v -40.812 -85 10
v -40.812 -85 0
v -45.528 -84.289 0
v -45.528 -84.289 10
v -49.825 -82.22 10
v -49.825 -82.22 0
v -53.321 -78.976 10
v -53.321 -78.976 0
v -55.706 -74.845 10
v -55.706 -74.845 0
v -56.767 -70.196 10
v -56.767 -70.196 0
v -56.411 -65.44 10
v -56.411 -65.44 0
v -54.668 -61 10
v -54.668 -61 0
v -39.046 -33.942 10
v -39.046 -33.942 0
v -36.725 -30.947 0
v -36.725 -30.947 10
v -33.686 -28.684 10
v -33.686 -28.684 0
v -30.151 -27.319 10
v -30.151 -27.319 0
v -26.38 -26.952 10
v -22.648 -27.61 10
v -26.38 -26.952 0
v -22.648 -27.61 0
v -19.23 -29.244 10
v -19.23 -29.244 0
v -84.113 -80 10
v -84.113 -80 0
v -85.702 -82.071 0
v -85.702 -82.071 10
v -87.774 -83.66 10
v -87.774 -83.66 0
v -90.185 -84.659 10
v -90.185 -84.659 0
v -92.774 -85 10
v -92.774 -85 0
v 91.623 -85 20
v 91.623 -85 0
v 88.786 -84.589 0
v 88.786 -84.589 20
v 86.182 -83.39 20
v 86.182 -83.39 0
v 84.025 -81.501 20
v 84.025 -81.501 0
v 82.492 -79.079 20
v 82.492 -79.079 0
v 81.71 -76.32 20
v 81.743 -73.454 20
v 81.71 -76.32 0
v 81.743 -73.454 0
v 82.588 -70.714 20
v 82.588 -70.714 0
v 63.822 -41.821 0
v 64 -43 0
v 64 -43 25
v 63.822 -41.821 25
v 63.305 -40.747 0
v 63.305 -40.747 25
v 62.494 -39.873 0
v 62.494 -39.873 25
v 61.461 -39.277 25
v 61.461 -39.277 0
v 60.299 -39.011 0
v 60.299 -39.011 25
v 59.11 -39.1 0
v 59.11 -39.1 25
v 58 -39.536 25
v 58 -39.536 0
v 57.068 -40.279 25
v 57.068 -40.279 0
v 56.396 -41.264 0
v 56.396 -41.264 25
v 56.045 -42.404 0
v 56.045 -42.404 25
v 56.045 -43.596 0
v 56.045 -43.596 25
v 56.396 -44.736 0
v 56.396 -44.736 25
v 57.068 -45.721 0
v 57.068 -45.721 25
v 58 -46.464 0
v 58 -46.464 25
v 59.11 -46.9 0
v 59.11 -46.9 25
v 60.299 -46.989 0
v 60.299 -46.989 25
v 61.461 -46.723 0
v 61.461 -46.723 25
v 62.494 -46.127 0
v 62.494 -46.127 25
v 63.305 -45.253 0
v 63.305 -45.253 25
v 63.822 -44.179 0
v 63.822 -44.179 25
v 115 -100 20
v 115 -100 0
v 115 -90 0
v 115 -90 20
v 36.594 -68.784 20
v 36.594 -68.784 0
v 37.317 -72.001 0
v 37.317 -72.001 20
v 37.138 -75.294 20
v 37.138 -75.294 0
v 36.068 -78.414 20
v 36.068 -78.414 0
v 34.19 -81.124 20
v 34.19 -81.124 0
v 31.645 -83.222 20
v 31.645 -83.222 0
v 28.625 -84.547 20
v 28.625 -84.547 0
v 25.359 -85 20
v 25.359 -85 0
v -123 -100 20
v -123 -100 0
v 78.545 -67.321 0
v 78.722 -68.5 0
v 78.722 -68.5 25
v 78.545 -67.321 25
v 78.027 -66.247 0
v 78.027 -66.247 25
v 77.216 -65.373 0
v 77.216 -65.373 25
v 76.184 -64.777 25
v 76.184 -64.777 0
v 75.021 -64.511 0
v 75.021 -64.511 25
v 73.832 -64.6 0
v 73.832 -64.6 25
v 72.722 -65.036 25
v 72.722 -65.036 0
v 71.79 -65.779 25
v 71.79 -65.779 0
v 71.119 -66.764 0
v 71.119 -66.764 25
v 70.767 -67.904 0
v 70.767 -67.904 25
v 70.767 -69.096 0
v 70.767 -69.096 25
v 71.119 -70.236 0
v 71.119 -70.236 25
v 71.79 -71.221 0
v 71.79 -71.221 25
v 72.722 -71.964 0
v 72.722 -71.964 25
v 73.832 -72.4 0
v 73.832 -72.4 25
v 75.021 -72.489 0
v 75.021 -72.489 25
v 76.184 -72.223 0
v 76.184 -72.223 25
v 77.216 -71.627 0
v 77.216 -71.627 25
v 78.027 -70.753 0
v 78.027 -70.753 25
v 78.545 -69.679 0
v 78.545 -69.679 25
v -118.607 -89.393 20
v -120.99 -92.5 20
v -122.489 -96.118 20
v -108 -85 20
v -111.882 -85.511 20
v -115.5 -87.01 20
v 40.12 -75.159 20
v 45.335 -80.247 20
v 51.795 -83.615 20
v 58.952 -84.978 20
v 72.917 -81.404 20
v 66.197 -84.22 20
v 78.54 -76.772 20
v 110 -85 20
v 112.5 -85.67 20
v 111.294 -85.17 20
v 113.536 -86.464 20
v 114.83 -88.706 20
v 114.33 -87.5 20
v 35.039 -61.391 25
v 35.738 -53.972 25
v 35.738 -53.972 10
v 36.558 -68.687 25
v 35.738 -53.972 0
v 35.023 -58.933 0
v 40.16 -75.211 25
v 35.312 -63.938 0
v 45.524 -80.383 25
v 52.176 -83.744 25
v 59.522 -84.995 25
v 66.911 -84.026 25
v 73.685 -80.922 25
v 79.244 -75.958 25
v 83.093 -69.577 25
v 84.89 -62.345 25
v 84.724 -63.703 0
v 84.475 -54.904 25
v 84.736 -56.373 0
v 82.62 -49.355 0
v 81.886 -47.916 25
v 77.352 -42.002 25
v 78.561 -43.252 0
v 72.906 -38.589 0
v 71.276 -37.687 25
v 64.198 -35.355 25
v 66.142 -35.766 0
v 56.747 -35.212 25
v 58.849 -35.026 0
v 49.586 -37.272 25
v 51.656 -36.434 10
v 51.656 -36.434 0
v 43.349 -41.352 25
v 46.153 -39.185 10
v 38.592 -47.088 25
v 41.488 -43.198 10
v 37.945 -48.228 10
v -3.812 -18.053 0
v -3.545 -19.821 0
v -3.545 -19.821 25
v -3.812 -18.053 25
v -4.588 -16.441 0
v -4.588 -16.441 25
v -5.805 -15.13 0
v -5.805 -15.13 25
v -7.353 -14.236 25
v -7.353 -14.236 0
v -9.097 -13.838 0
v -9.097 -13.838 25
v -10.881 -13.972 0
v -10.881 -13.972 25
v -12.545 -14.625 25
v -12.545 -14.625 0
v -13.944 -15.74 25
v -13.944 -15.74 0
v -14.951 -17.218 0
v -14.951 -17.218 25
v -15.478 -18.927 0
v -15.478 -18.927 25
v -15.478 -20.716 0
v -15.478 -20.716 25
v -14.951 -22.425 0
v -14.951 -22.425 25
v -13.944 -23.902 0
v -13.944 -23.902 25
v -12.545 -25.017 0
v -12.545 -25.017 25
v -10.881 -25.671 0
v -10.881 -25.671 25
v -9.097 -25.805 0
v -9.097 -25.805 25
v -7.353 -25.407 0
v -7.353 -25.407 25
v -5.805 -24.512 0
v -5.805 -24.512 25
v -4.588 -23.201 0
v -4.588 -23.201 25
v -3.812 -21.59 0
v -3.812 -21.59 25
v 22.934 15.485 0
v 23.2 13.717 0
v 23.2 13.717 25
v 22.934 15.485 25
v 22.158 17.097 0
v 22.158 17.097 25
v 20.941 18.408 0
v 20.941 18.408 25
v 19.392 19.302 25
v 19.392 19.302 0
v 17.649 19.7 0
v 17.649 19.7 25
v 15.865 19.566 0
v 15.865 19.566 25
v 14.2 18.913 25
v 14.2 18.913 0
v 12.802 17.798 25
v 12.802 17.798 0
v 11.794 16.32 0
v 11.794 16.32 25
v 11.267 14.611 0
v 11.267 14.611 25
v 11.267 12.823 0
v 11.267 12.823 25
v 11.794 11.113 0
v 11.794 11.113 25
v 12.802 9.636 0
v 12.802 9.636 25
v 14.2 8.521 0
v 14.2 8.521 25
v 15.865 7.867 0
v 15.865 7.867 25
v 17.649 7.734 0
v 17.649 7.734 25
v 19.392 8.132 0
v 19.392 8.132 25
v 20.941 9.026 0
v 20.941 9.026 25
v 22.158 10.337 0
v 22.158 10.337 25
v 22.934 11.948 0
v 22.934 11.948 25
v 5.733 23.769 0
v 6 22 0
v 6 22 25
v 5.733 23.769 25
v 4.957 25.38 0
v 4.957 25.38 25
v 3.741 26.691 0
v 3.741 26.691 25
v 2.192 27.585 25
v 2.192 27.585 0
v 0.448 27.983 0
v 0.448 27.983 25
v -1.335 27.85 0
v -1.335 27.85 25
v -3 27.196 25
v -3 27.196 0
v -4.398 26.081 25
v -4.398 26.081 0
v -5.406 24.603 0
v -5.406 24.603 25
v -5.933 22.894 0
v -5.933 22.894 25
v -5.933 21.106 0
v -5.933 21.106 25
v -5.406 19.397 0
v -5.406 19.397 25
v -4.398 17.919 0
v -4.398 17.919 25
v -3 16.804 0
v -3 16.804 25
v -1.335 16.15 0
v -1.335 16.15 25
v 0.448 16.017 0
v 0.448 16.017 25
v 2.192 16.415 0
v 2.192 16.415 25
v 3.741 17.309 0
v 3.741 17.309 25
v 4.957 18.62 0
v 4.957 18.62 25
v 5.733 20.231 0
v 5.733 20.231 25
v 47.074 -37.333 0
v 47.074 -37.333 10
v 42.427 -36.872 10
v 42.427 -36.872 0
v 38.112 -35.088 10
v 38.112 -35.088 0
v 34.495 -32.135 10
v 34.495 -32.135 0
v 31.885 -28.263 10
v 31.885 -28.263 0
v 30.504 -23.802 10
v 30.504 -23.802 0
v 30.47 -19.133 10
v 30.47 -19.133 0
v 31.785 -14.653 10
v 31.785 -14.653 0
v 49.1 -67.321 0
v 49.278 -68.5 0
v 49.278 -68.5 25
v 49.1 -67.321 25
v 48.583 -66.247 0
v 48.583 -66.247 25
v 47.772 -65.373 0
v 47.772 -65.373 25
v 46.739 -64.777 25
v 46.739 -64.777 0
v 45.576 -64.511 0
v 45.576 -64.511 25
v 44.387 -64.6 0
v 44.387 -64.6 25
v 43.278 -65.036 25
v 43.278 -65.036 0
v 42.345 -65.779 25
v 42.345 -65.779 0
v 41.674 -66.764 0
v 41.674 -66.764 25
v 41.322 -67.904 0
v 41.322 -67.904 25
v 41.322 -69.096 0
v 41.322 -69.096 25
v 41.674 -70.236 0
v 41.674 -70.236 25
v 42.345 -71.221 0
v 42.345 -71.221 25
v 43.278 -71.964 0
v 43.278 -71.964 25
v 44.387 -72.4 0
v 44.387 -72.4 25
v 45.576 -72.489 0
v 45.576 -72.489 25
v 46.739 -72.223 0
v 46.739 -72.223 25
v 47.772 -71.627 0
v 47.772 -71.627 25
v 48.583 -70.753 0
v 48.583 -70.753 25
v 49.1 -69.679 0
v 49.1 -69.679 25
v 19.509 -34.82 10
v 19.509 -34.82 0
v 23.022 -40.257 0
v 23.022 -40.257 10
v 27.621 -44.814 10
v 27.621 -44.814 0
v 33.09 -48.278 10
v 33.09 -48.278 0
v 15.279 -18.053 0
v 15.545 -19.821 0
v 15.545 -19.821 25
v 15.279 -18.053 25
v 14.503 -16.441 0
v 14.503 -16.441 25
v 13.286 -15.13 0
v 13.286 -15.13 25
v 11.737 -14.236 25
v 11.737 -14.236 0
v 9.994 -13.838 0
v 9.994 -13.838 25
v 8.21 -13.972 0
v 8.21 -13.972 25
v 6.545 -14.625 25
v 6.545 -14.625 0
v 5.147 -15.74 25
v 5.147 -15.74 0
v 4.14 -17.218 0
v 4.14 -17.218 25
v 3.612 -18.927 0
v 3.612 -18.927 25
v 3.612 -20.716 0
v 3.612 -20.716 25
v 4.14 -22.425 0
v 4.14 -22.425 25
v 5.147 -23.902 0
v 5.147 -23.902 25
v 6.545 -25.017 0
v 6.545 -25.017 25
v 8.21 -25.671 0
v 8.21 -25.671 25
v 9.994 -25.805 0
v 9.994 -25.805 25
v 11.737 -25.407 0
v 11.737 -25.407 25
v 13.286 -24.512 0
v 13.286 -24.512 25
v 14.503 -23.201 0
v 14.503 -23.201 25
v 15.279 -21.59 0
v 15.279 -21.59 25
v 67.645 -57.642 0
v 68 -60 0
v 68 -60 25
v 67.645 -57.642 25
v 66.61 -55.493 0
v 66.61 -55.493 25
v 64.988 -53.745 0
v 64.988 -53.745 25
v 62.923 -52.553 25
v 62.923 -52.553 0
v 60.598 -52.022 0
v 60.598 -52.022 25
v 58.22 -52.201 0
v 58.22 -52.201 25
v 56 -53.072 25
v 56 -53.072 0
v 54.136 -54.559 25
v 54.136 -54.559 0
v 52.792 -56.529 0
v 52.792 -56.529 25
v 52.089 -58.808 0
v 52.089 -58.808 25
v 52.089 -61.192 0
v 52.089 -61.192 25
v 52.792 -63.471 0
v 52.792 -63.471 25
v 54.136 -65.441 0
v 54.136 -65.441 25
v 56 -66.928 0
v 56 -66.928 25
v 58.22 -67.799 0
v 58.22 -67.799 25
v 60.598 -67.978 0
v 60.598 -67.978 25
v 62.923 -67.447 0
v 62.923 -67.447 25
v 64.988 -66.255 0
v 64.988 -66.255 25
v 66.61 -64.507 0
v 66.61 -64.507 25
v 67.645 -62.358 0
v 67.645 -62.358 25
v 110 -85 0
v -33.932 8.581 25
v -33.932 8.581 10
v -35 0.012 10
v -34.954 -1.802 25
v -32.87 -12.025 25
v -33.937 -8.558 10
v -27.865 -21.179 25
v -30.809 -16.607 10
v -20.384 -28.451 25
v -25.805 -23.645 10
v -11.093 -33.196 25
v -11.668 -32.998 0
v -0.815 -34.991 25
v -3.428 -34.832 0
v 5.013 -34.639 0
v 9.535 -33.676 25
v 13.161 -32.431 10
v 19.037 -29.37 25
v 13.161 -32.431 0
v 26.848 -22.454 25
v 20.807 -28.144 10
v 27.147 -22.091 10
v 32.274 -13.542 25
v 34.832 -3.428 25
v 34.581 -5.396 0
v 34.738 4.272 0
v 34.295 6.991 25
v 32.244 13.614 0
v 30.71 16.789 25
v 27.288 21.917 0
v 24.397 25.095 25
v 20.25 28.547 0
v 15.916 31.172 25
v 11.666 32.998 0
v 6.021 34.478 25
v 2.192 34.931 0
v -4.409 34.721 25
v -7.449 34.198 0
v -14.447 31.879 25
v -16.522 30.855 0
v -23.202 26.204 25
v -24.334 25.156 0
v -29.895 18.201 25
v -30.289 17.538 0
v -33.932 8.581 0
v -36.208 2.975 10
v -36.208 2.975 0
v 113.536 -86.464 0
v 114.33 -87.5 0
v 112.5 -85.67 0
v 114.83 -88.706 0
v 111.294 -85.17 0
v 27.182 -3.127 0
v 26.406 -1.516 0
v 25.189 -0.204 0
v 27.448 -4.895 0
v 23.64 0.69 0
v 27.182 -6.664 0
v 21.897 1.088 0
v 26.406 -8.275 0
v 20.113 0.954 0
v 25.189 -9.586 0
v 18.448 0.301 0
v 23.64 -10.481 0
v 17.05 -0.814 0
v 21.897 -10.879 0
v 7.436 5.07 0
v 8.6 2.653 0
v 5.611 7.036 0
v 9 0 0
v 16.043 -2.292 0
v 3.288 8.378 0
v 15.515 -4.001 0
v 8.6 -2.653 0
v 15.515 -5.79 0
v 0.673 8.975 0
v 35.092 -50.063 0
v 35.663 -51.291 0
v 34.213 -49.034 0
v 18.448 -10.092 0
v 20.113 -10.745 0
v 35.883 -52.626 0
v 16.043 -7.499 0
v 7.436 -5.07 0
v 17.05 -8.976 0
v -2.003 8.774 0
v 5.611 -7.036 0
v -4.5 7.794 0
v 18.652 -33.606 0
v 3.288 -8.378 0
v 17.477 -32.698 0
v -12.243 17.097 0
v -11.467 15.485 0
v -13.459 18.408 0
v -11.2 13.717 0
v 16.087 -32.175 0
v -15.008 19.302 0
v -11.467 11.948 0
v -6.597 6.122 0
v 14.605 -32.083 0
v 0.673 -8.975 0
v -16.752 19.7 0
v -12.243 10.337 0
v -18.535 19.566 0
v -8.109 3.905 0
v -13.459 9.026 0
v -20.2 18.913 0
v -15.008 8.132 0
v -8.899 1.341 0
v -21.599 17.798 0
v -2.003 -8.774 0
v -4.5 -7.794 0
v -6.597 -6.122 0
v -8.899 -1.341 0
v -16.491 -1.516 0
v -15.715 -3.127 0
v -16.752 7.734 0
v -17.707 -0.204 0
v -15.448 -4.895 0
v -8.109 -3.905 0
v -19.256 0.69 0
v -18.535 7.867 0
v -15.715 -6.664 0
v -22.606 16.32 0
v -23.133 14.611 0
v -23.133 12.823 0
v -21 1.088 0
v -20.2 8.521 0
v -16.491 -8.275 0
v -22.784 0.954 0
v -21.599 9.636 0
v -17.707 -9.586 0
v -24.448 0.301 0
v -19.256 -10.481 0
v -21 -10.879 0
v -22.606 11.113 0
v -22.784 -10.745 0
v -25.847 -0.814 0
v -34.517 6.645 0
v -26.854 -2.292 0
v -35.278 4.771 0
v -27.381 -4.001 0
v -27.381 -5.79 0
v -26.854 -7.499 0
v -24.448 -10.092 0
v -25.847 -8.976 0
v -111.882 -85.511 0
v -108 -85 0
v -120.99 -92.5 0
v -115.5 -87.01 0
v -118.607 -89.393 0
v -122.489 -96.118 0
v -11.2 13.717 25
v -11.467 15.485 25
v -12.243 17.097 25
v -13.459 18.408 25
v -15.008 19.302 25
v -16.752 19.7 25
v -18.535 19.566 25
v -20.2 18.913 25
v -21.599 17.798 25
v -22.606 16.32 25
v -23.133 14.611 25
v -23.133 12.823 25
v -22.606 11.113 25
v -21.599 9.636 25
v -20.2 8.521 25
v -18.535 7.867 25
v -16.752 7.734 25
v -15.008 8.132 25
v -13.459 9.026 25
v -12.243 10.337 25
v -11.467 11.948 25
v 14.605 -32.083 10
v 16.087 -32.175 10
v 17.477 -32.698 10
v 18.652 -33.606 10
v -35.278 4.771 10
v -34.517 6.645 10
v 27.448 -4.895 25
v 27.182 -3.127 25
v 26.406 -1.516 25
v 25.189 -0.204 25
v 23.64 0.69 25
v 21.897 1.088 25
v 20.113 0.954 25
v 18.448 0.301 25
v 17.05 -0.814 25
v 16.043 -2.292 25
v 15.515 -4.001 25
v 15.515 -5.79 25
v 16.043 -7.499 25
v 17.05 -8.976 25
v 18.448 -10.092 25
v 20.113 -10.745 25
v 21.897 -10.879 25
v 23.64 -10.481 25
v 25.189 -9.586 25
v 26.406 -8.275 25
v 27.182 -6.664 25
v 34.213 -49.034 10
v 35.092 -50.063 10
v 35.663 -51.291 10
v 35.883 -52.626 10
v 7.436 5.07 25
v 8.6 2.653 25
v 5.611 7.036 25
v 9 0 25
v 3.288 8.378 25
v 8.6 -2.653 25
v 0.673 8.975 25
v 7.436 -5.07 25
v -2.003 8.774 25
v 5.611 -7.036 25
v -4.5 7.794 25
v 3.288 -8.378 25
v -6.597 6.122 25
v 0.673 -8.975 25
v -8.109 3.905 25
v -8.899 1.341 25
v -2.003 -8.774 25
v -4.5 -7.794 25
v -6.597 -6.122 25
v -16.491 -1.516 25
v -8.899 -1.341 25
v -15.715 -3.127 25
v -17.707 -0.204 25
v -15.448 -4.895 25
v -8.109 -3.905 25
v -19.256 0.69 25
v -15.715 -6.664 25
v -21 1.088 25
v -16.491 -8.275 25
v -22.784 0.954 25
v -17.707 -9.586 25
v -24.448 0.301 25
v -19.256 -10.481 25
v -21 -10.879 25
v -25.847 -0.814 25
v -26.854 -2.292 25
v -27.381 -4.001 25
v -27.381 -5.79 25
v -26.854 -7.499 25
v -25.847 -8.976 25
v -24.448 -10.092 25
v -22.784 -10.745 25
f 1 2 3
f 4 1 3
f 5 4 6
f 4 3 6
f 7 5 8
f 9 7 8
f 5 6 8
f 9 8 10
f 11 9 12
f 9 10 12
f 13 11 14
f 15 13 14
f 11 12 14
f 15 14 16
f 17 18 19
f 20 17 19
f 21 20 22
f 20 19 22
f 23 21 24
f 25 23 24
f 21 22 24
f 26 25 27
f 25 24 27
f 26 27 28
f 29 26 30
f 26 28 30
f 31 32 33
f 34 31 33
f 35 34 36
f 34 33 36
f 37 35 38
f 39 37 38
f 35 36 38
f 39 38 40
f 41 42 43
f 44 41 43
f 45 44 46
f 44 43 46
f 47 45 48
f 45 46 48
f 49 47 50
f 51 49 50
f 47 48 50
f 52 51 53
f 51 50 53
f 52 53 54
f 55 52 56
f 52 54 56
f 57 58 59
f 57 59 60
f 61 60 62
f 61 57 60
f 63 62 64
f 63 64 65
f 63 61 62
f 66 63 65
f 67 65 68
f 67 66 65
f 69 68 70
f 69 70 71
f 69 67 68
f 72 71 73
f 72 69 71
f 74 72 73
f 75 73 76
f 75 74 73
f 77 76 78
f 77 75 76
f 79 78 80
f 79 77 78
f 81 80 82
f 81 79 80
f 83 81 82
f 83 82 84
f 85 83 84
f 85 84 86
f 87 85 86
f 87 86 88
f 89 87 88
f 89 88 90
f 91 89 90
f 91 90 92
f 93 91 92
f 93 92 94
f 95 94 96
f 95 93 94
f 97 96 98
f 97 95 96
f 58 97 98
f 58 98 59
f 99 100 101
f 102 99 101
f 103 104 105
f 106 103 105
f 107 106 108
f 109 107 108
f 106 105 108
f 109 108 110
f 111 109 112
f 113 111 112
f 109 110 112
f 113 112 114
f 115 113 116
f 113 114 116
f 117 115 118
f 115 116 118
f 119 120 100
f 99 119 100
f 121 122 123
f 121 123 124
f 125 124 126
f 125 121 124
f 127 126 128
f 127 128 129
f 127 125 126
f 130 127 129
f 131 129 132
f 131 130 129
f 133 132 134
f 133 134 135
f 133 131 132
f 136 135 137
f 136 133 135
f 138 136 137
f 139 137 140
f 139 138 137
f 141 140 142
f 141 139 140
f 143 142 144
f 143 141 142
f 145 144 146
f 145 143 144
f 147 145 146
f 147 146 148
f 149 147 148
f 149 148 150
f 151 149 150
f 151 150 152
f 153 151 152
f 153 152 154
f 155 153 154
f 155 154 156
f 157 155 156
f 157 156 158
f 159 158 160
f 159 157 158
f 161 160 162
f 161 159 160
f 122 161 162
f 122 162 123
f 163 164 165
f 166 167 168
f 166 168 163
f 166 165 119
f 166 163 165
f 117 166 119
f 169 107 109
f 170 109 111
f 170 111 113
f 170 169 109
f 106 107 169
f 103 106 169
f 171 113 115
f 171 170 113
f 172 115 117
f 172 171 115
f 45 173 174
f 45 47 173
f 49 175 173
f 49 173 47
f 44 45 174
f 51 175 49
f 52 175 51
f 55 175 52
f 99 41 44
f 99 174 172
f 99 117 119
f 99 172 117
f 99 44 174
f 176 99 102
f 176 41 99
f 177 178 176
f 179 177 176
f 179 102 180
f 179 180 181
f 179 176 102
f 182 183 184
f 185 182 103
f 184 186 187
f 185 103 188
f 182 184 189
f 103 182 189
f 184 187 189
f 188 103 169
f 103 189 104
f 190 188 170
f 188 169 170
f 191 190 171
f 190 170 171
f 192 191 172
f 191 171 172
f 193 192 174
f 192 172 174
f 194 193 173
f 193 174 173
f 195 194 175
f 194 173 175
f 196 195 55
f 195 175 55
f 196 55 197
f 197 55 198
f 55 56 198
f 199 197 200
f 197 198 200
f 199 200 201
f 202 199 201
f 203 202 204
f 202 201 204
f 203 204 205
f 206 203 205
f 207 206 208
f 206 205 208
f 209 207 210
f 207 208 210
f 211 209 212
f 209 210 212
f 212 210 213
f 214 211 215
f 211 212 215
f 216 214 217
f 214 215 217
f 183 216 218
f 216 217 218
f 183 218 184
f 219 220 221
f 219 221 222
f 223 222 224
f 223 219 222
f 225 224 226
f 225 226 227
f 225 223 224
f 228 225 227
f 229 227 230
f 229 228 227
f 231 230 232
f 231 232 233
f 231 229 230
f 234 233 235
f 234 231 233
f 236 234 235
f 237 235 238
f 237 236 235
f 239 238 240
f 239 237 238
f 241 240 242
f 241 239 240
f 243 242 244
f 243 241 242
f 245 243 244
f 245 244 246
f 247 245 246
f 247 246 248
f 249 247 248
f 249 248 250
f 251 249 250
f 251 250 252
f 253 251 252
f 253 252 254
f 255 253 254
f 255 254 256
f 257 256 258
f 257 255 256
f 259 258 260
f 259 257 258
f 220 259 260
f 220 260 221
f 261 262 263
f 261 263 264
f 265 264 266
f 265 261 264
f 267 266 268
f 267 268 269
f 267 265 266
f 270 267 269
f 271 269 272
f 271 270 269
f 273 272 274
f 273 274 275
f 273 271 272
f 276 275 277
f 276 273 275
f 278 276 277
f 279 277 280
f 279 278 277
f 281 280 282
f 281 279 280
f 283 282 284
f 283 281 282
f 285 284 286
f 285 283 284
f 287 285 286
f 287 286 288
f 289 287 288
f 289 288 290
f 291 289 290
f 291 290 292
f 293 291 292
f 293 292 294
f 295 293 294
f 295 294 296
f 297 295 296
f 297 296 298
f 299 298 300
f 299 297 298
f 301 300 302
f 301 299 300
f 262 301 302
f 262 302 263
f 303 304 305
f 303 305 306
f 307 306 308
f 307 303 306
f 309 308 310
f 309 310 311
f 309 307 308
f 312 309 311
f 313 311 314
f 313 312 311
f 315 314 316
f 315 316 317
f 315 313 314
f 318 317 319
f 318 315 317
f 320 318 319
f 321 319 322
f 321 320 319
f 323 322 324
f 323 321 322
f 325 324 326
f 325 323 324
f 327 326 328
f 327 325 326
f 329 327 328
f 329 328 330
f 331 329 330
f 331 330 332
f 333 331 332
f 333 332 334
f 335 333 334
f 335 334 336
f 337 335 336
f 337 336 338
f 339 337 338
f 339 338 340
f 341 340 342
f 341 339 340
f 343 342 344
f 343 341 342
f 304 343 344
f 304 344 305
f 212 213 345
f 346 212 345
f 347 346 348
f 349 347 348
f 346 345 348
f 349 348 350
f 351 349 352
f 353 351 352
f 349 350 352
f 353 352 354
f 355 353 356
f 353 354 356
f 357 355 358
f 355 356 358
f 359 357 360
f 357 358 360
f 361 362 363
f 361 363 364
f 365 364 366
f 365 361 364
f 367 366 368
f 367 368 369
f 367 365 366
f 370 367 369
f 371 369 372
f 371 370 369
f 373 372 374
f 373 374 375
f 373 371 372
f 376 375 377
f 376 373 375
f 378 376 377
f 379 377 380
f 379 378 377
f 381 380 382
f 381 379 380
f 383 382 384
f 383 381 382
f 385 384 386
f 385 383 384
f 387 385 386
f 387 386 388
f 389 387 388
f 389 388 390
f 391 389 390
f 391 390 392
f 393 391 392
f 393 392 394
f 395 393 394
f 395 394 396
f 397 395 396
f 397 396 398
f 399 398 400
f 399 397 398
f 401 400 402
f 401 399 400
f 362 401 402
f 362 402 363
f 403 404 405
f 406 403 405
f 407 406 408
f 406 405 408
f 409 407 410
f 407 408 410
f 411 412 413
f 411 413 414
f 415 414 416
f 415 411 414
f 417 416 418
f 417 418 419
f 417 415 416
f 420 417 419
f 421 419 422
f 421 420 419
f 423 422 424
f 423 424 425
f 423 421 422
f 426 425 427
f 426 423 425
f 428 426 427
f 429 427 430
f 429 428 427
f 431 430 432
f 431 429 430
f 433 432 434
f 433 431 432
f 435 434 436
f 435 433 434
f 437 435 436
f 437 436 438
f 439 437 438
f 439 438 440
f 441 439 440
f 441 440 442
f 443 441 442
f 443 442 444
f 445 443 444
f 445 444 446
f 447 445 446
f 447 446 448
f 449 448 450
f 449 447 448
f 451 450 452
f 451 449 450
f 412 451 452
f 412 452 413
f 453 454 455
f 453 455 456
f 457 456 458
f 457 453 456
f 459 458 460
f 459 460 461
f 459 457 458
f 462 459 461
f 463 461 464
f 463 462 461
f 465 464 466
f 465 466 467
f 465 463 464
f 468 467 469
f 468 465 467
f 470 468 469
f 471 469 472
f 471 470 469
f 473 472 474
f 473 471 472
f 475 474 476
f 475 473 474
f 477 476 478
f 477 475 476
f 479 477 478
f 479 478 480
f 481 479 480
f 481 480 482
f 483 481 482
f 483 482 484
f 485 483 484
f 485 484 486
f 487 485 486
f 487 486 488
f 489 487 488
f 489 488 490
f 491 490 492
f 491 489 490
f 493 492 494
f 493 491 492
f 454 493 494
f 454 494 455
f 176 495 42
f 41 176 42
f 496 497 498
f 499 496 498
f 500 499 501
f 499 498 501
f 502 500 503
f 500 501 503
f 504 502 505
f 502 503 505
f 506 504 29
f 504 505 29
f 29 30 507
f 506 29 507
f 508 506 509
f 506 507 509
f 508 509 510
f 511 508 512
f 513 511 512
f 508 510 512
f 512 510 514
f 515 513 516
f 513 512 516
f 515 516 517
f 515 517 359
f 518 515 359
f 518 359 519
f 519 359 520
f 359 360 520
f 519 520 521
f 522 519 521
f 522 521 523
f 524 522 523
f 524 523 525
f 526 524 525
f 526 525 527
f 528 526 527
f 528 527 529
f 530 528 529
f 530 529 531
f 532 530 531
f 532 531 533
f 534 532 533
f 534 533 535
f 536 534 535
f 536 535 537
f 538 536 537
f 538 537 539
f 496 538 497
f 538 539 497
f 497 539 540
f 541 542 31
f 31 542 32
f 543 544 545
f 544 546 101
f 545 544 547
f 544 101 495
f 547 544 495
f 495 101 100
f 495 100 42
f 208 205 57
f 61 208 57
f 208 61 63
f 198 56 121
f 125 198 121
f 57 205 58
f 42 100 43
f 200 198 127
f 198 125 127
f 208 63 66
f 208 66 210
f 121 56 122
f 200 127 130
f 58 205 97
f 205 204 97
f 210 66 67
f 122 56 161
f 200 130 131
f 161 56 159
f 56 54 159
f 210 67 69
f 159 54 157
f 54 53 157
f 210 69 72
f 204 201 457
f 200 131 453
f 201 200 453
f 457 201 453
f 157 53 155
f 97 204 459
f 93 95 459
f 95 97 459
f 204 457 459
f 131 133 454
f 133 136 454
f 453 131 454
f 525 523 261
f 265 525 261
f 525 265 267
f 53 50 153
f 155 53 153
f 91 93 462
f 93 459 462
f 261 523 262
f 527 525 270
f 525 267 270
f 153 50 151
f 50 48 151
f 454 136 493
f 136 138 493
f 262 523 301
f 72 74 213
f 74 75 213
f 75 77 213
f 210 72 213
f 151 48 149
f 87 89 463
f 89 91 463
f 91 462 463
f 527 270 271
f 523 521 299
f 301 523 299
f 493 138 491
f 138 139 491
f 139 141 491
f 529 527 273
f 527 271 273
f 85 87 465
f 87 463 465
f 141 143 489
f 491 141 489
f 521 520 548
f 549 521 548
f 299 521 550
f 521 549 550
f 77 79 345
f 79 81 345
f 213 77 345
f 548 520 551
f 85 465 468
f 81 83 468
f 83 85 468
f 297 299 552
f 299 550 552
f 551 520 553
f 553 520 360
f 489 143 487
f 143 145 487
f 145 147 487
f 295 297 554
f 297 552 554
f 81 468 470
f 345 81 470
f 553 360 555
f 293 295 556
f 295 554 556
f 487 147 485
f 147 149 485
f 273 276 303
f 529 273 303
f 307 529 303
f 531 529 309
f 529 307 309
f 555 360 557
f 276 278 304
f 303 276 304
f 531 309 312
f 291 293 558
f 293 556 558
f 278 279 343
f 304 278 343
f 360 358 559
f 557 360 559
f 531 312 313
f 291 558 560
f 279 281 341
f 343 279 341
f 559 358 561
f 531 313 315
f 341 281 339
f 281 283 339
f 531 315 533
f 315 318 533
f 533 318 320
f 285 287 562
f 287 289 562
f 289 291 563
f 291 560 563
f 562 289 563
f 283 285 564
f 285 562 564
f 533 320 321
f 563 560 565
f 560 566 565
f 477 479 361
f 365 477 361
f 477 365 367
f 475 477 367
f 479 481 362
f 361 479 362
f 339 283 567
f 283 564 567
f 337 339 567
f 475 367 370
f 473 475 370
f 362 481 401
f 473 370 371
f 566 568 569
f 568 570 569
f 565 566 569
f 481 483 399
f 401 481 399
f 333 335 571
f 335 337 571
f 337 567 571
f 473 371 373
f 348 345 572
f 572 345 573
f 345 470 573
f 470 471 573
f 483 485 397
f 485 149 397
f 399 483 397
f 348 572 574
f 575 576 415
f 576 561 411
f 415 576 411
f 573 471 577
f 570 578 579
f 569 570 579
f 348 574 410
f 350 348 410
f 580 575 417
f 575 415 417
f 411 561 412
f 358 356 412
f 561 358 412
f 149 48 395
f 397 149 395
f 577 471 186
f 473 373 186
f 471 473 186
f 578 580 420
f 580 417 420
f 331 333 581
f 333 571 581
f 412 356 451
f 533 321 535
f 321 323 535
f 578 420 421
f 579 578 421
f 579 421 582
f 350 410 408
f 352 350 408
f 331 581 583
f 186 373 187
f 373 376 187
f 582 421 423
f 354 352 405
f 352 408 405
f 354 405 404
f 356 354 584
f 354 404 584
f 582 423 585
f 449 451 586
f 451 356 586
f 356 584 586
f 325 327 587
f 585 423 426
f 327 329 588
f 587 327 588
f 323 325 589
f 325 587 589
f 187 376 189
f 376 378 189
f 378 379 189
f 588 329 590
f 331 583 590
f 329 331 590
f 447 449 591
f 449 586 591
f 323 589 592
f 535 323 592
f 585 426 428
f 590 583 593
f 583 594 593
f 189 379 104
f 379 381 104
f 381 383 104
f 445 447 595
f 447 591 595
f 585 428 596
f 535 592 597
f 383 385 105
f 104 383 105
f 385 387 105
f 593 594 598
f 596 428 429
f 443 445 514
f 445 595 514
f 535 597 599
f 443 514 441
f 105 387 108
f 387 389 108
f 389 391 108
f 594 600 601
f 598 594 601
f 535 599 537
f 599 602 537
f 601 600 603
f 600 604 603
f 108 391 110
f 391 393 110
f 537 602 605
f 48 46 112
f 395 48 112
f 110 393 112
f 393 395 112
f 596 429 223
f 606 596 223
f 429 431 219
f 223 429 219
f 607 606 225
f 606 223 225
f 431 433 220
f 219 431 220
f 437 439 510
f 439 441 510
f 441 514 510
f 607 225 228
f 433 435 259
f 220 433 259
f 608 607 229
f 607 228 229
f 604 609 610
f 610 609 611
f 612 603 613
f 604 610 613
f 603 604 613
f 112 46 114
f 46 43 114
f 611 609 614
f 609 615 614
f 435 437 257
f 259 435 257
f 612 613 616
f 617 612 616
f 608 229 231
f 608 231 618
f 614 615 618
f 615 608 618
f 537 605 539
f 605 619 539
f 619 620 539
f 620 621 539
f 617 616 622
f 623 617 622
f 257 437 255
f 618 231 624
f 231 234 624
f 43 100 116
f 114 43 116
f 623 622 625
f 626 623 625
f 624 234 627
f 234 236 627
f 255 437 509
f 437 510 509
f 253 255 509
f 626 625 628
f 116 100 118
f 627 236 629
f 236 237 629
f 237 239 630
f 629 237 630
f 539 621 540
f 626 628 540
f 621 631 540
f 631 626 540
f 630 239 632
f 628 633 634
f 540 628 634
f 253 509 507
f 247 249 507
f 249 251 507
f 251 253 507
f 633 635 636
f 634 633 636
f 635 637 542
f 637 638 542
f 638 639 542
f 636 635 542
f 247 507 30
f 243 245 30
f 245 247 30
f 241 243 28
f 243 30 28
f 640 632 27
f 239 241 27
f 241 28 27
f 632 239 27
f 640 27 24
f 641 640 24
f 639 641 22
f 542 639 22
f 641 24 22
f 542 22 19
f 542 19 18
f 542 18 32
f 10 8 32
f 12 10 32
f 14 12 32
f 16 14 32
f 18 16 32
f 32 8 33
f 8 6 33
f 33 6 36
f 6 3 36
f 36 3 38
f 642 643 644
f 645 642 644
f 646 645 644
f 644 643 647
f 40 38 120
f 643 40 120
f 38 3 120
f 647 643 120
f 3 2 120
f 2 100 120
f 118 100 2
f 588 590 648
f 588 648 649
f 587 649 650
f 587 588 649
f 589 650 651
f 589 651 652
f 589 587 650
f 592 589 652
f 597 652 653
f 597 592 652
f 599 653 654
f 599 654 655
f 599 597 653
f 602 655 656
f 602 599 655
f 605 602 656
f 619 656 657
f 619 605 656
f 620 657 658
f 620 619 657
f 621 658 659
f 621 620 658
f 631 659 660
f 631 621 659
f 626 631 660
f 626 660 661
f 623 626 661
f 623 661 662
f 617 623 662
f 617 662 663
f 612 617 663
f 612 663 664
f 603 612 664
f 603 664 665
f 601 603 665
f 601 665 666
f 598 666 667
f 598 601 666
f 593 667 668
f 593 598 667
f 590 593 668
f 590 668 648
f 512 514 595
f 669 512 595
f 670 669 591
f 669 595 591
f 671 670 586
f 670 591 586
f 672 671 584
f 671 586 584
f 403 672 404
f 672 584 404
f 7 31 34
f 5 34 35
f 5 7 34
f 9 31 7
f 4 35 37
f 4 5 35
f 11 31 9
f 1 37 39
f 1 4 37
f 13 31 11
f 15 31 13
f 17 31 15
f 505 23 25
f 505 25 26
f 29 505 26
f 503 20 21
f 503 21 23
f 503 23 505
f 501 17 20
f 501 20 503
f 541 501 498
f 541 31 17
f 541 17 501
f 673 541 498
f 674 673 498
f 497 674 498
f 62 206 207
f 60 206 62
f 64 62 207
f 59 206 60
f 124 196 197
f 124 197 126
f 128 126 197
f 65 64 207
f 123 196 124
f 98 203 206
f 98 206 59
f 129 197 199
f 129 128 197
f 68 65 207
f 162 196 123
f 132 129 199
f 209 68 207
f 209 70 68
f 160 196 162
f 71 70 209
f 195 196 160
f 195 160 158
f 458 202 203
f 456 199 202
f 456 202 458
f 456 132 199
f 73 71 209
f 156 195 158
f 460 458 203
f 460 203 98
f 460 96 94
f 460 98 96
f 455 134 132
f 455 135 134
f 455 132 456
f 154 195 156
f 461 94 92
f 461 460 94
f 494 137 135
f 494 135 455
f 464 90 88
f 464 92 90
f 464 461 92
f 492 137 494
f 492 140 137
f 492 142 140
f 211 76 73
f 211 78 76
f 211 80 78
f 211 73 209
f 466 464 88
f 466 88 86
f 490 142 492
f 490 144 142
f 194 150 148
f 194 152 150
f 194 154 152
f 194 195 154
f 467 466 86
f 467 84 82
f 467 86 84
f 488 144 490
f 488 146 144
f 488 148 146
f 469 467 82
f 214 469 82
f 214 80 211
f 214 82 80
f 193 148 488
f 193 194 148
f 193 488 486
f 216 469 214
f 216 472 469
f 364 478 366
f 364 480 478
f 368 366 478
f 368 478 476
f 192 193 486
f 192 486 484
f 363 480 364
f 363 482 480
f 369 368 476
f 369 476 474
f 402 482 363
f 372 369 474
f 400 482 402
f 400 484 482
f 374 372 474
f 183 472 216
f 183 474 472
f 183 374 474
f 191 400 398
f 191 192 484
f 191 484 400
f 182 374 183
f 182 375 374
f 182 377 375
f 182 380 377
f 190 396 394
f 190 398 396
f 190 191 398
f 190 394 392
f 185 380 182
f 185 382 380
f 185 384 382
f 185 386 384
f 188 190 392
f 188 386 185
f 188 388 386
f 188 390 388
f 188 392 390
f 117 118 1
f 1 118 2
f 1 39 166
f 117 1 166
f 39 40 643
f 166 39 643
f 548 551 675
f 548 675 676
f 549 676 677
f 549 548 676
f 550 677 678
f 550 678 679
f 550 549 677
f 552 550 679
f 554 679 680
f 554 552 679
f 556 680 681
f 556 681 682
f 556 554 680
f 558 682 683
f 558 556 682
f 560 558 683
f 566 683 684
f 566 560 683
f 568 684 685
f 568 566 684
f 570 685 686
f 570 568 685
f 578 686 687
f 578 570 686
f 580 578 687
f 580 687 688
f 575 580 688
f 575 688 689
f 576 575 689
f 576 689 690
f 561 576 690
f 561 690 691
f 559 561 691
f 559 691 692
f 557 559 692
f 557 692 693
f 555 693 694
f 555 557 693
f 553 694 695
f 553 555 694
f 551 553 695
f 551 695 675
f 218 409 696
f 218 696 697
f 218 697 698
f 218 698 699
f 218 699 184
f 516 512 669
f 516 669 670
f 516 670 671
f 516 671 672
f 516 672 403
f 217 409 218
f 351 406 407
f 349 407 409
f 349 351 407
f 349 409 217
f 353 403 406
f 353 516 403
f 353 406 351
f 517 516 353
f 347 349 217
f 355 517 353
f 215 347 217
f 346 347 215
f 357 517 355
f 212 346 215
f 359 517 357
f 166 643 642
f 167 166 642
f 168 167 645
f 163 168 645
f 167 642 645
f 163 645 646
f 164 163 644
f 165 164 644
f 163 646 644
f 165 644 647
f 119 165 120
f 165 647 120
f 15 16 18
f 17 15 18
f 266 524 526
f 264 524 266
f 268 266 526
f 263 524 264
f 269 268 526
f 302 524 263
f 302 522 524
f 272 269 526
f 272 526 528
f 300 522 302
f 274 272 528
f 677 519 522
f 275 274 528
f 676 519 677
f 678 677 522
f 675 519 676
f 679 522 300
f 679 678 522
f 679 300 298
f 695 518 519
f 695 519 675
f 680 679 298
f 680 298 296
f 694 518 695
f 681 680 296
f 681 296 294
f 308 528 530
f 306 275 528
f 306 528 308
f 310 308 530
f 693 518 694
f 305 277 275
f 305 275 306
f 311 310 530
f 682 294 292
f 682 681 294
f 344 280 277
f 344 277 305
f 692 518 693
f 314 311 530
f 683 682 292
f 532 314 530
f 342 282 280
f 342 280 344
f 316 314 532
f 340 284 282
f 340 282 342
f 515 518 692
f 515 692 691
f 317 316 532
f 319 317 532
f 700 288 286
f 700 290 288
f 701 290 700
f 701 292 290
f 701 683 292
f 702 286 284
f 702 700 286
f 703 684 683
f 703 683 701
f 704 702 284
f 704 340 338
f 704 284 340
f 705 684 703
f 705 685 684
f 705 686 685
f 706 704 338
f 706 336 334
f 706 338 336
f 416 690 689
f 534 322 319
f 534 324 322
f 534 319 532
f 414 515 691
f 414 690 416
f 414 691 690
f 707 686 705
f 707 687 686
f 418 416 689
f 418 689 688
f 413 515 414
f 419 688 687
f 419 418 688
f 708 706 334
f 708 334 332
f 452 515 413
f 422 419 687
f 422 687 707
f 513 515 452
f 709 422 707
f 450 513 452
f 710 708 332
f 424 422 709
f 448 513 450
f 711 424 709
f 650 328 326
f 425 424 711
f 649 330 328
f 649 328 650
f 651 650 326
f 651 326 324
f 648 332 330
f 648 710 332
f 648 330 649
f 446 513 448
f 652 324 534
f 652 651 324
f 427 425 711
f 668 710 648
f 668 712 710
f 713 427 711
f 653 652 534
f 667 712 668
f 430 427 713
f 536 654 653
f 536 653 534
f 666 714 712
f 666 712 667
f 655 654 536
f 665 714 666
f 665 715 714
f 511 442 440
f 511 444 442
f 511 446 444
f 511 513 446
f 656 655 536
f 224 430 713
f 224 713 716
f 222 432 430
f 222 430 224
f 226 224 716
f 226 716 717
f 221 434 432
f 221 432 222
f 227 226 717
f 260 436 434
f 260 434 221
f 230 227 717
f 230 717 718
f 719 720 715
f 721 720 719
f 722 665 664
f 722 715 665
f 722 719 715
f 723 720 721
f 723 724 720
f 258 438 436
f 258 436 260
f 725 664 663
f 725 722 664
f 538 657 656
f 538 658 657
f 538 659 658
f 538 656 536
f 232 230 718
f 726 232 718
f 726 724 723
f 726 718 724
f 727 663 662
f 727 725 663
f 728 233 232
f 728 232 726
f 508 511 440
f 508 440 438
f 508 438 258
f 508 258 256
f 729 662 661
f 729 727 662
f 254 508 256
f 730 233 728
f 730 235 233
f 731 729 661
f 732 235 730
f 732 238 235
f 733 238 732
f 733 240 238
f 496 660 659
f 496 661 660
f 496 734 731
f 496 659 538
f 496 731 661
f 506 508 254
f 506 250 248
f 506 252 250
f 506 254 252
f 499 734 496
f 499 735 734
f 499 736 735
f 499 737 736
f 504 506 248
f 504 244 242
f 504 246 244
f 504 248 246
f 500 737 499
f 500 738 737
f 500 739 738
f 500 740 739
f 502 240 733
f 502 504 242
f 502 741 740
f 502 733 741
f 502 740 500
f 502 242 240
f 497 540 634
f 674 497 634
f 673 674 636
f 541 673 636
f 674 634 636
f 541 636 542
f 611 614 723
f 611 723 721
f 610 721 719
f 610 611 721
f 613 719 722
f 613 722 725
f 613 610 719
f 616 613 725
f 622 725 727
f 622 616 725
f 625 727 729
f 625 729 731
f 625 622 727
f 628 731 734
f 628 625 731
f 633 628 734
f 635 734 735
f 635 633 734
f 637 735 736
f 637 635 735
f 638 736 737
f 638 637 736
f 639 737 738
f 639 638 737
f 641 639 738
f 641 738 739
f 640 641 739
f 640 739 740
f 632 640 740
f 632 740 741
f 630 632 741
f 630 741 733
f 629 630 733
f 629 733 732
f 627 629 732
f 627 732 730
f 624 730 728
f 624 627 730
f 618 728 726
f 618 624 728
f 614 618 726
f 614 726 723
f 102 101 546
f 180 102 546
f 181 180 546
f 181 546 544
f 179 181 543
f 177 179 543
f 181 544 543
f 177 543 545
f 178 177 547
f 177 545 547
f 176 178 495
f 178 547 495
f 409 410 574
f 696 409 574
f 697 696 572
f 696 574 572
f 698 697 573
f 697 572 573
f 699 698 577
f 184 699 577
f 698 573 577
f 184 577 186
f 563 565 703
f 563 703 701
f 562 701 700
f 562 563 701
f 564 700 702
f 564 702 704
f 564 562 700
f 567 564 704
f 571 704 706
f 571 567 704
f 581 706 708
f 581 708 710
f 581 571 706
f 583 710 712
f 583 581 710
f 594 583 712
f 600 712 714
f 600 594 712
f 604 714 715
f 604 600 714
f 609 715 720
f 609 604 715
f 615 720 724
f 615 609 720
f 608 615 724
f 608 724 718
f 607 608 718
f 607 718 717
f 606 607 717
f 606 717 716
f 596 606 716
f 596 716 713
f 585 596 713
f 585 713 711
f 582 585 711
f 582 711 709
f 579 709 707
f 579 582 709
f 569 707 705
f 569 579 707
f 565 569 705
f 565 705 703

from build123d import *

# Parameters (mm, degrees)
EXTRUDE_1_DEPTH   = 10
EXTRUDE_1_2_DEPTH = 10
EXTRUDE_2_DEPTH   = 20
SKETCH_1_4_R      = 35
SKETCH_1_4_R_2    = 6
SKETCH_1_4_R_3    = 9
SKETCH_1_4_R_4    = 25
SKETCH_1_4_R_5    = 8
SKETCH_1_4_R_6    = 4
EXTRUDE_3_DEPTH   = 25


# Read off the part's stored shape, not the designer's step: Бобышка-Вытянуть2
with BuildPart() as part:
    # Эскиз1 → Бобышка-Вытянуть1 (new body)
    with BuildSketch(Plane.XY):
        with BuildLine():
            ThreePointArc((-84.113248654, -80), (-87.773502692, -83.660254038), (-92.773502692, -85))
            Line((-92.773502692, -85), (-68.524791386, -85))
            Line((-68.524791386, -85), (-40.811978465, -85))
            ThreePointArc((-40.811978465, -85), (-54.668384925, -77), (-54.668384925, -61))
            Line((-54.668384925, -61), (-39.046205937, -33.941592266))
            ThreePointArc((-39.046205937, -33.941592266), (-30.151152872, -27.319125354), (-19.22989306, -29.243994476))
            ThreePointArc((-19.22989306, -29.243994476), (-32.622426184, -12.679799284), (-33.931812223, 8.580915992))
            ThreePointArc((-33.931812223, 8.580915992), (-34.876159455, 5.699155379), (-36.207821023, 2.974634616))
            Line((-36.207821023, 2.974634616), (-84.113248654, -80))
        make_face()
    extrude(amount=EXTRUDE_1_DEPTH)

    # Бобышка-Вытянуть2 outline → Бобышка-Вытянуть2 (add)
    with BuildSketch(Plane.XY):
        with BuildLine():
            ThreePointArc((91.622776602, -85), (83.171234054, -80.345224838), (82.587697573, -70.714285714))
            ThreePointArc((82.587697573, -70.714285714), (58.951595602, -84.978007291), (36.593908006, -68.783783784))
            ThreePointArc((36.593908006, -68.783783784), (35.222923087, -79.833937569), (25.358983849, -85))
            Line((25.358983849, -85), (-108.0001, -85))
            ThreePointArc((-108.0001, -85), (-118.606631007, -89.393368993), (-123, -99.9999))
            Line((-123, -99.9999), (115, -100))
            Line((115, -100), (115, -90))
            ThreePointArc((115, -90), (113.535533906, -86.464466094), (110, -85))
            Line((110, -85), (91.622776602, -85))
        make_face()
    extrude(amount=EXTRUDE_2_DEPTH)



with BuildPart() as body_2:
    # Эскиз1 → Extrude 1 2 (new body)
    with BuildSketch(Plane.XY):
        with BuildLine():
            ThreePointArc((33.089534913, -48.278298017), (35.418808442, -50.657512303), (35.737666875, -53.971800326))
            ThreePointArc((35.737666875, -53.971800326), (41.48802535, -43.198012184), (51.655818839, -36.433612056))
            ThreePointArc((51.655818839, -36.433612056), (34.49538534, -32.134623915), (31.785176497, -14.652732))
            ThreePointArc((31.785176497, -14.652732), (24.167277738, -25.316845908), (13.16091541, -32.431316741))
            ThreePointArc((13.16091541, -32.431316741), (16.80172204, -32.384616215), (19.508831427, -34.819613673))
            ThreePointArc((19.508831427, -34.819613673), (25.198282119, -42.659837887), (33.089534913, -48.278298017))
        make_face()
    extrude(amount=EXTRUDE_1_2_DEPTH)


with BuildPart() as part_1:
    add(part.part)

    add(body_2.part)  # Бобышка-Вытянуть3 merges body 2
    # Эскиз1<4> → Бобышка-Вытянуть3 (add)
    # profile 1 of 2: a face of its own
    with BuildSketch(Plane.XY):
        with Locations(Location((0, 0, 0), (0, 0, 165.808177005))):
            Circle(SKETCH_1_4_R)
        with Locations((-17.200292614, 13.716775641)):
            Circle(SKETCH_1_4_R_2, mode=Mode.SUBTRACT)
        with Locations((-21.448414068, -4.895460547)):
            Circle(SKETCH_1_4_R_2, mode=Mode.SUBTRACT)
        with Locations((-9.545442261, -19.821315094)):
            Circle(SKETCH_1_4_R_2, mode=Mode.SUBTRACT)
        with Locations((9.545442261, -19.821315094)):
            Circle(SKETCH_1_4_R_2, mode=Mode.SUBTRACT)
        with Locations((21.448414068, -4.895460547)):
            Circle(SKETCH_1_4_R_2, mode=Mode.SUBTRACT)
        with Locations((17.200292614, 13.716775641)):
            Circle(SKETCH_1_4_R_2, mode=Mode.SUBTRACT)
        with Locations((0, 22)):
            Circle(SKETCH_1_4_R_2, mode=Mode.SUBTRACT)
        Circle(SKETCH_1_4_R_3, mode=Mode.SUBTRACT)
    # profile 2 of 2: a face of its own
    with BuildSketch(Plane.XY):
        with Locations(Location((60, -60, 0), (0, 0, 166.046875379))):
            Circle(SKETCH_1_4_R_4)
        with Locations((60, -60)):
            Circle(SKETCH_1_4_R_5, mode=Mode.SUBTRACT)
        with Locations((45.277568136, -68.5)):
            Circle(SKETCH_1_4_R_6, mode=Mode.SUBTRACT)
        with Locations((74.722431864, -68.5)):
            Circle(SKETCH_1_4_R_6, mode=Mode.SUBTRACT)
        with Locations((60, -43)):
            Circle(SKETCH_1_4_R_6, mode=Mode.SUBTRACT)
    extrude(amount=EXTRUDE_3_DEPTH)


solid = part_1.part
